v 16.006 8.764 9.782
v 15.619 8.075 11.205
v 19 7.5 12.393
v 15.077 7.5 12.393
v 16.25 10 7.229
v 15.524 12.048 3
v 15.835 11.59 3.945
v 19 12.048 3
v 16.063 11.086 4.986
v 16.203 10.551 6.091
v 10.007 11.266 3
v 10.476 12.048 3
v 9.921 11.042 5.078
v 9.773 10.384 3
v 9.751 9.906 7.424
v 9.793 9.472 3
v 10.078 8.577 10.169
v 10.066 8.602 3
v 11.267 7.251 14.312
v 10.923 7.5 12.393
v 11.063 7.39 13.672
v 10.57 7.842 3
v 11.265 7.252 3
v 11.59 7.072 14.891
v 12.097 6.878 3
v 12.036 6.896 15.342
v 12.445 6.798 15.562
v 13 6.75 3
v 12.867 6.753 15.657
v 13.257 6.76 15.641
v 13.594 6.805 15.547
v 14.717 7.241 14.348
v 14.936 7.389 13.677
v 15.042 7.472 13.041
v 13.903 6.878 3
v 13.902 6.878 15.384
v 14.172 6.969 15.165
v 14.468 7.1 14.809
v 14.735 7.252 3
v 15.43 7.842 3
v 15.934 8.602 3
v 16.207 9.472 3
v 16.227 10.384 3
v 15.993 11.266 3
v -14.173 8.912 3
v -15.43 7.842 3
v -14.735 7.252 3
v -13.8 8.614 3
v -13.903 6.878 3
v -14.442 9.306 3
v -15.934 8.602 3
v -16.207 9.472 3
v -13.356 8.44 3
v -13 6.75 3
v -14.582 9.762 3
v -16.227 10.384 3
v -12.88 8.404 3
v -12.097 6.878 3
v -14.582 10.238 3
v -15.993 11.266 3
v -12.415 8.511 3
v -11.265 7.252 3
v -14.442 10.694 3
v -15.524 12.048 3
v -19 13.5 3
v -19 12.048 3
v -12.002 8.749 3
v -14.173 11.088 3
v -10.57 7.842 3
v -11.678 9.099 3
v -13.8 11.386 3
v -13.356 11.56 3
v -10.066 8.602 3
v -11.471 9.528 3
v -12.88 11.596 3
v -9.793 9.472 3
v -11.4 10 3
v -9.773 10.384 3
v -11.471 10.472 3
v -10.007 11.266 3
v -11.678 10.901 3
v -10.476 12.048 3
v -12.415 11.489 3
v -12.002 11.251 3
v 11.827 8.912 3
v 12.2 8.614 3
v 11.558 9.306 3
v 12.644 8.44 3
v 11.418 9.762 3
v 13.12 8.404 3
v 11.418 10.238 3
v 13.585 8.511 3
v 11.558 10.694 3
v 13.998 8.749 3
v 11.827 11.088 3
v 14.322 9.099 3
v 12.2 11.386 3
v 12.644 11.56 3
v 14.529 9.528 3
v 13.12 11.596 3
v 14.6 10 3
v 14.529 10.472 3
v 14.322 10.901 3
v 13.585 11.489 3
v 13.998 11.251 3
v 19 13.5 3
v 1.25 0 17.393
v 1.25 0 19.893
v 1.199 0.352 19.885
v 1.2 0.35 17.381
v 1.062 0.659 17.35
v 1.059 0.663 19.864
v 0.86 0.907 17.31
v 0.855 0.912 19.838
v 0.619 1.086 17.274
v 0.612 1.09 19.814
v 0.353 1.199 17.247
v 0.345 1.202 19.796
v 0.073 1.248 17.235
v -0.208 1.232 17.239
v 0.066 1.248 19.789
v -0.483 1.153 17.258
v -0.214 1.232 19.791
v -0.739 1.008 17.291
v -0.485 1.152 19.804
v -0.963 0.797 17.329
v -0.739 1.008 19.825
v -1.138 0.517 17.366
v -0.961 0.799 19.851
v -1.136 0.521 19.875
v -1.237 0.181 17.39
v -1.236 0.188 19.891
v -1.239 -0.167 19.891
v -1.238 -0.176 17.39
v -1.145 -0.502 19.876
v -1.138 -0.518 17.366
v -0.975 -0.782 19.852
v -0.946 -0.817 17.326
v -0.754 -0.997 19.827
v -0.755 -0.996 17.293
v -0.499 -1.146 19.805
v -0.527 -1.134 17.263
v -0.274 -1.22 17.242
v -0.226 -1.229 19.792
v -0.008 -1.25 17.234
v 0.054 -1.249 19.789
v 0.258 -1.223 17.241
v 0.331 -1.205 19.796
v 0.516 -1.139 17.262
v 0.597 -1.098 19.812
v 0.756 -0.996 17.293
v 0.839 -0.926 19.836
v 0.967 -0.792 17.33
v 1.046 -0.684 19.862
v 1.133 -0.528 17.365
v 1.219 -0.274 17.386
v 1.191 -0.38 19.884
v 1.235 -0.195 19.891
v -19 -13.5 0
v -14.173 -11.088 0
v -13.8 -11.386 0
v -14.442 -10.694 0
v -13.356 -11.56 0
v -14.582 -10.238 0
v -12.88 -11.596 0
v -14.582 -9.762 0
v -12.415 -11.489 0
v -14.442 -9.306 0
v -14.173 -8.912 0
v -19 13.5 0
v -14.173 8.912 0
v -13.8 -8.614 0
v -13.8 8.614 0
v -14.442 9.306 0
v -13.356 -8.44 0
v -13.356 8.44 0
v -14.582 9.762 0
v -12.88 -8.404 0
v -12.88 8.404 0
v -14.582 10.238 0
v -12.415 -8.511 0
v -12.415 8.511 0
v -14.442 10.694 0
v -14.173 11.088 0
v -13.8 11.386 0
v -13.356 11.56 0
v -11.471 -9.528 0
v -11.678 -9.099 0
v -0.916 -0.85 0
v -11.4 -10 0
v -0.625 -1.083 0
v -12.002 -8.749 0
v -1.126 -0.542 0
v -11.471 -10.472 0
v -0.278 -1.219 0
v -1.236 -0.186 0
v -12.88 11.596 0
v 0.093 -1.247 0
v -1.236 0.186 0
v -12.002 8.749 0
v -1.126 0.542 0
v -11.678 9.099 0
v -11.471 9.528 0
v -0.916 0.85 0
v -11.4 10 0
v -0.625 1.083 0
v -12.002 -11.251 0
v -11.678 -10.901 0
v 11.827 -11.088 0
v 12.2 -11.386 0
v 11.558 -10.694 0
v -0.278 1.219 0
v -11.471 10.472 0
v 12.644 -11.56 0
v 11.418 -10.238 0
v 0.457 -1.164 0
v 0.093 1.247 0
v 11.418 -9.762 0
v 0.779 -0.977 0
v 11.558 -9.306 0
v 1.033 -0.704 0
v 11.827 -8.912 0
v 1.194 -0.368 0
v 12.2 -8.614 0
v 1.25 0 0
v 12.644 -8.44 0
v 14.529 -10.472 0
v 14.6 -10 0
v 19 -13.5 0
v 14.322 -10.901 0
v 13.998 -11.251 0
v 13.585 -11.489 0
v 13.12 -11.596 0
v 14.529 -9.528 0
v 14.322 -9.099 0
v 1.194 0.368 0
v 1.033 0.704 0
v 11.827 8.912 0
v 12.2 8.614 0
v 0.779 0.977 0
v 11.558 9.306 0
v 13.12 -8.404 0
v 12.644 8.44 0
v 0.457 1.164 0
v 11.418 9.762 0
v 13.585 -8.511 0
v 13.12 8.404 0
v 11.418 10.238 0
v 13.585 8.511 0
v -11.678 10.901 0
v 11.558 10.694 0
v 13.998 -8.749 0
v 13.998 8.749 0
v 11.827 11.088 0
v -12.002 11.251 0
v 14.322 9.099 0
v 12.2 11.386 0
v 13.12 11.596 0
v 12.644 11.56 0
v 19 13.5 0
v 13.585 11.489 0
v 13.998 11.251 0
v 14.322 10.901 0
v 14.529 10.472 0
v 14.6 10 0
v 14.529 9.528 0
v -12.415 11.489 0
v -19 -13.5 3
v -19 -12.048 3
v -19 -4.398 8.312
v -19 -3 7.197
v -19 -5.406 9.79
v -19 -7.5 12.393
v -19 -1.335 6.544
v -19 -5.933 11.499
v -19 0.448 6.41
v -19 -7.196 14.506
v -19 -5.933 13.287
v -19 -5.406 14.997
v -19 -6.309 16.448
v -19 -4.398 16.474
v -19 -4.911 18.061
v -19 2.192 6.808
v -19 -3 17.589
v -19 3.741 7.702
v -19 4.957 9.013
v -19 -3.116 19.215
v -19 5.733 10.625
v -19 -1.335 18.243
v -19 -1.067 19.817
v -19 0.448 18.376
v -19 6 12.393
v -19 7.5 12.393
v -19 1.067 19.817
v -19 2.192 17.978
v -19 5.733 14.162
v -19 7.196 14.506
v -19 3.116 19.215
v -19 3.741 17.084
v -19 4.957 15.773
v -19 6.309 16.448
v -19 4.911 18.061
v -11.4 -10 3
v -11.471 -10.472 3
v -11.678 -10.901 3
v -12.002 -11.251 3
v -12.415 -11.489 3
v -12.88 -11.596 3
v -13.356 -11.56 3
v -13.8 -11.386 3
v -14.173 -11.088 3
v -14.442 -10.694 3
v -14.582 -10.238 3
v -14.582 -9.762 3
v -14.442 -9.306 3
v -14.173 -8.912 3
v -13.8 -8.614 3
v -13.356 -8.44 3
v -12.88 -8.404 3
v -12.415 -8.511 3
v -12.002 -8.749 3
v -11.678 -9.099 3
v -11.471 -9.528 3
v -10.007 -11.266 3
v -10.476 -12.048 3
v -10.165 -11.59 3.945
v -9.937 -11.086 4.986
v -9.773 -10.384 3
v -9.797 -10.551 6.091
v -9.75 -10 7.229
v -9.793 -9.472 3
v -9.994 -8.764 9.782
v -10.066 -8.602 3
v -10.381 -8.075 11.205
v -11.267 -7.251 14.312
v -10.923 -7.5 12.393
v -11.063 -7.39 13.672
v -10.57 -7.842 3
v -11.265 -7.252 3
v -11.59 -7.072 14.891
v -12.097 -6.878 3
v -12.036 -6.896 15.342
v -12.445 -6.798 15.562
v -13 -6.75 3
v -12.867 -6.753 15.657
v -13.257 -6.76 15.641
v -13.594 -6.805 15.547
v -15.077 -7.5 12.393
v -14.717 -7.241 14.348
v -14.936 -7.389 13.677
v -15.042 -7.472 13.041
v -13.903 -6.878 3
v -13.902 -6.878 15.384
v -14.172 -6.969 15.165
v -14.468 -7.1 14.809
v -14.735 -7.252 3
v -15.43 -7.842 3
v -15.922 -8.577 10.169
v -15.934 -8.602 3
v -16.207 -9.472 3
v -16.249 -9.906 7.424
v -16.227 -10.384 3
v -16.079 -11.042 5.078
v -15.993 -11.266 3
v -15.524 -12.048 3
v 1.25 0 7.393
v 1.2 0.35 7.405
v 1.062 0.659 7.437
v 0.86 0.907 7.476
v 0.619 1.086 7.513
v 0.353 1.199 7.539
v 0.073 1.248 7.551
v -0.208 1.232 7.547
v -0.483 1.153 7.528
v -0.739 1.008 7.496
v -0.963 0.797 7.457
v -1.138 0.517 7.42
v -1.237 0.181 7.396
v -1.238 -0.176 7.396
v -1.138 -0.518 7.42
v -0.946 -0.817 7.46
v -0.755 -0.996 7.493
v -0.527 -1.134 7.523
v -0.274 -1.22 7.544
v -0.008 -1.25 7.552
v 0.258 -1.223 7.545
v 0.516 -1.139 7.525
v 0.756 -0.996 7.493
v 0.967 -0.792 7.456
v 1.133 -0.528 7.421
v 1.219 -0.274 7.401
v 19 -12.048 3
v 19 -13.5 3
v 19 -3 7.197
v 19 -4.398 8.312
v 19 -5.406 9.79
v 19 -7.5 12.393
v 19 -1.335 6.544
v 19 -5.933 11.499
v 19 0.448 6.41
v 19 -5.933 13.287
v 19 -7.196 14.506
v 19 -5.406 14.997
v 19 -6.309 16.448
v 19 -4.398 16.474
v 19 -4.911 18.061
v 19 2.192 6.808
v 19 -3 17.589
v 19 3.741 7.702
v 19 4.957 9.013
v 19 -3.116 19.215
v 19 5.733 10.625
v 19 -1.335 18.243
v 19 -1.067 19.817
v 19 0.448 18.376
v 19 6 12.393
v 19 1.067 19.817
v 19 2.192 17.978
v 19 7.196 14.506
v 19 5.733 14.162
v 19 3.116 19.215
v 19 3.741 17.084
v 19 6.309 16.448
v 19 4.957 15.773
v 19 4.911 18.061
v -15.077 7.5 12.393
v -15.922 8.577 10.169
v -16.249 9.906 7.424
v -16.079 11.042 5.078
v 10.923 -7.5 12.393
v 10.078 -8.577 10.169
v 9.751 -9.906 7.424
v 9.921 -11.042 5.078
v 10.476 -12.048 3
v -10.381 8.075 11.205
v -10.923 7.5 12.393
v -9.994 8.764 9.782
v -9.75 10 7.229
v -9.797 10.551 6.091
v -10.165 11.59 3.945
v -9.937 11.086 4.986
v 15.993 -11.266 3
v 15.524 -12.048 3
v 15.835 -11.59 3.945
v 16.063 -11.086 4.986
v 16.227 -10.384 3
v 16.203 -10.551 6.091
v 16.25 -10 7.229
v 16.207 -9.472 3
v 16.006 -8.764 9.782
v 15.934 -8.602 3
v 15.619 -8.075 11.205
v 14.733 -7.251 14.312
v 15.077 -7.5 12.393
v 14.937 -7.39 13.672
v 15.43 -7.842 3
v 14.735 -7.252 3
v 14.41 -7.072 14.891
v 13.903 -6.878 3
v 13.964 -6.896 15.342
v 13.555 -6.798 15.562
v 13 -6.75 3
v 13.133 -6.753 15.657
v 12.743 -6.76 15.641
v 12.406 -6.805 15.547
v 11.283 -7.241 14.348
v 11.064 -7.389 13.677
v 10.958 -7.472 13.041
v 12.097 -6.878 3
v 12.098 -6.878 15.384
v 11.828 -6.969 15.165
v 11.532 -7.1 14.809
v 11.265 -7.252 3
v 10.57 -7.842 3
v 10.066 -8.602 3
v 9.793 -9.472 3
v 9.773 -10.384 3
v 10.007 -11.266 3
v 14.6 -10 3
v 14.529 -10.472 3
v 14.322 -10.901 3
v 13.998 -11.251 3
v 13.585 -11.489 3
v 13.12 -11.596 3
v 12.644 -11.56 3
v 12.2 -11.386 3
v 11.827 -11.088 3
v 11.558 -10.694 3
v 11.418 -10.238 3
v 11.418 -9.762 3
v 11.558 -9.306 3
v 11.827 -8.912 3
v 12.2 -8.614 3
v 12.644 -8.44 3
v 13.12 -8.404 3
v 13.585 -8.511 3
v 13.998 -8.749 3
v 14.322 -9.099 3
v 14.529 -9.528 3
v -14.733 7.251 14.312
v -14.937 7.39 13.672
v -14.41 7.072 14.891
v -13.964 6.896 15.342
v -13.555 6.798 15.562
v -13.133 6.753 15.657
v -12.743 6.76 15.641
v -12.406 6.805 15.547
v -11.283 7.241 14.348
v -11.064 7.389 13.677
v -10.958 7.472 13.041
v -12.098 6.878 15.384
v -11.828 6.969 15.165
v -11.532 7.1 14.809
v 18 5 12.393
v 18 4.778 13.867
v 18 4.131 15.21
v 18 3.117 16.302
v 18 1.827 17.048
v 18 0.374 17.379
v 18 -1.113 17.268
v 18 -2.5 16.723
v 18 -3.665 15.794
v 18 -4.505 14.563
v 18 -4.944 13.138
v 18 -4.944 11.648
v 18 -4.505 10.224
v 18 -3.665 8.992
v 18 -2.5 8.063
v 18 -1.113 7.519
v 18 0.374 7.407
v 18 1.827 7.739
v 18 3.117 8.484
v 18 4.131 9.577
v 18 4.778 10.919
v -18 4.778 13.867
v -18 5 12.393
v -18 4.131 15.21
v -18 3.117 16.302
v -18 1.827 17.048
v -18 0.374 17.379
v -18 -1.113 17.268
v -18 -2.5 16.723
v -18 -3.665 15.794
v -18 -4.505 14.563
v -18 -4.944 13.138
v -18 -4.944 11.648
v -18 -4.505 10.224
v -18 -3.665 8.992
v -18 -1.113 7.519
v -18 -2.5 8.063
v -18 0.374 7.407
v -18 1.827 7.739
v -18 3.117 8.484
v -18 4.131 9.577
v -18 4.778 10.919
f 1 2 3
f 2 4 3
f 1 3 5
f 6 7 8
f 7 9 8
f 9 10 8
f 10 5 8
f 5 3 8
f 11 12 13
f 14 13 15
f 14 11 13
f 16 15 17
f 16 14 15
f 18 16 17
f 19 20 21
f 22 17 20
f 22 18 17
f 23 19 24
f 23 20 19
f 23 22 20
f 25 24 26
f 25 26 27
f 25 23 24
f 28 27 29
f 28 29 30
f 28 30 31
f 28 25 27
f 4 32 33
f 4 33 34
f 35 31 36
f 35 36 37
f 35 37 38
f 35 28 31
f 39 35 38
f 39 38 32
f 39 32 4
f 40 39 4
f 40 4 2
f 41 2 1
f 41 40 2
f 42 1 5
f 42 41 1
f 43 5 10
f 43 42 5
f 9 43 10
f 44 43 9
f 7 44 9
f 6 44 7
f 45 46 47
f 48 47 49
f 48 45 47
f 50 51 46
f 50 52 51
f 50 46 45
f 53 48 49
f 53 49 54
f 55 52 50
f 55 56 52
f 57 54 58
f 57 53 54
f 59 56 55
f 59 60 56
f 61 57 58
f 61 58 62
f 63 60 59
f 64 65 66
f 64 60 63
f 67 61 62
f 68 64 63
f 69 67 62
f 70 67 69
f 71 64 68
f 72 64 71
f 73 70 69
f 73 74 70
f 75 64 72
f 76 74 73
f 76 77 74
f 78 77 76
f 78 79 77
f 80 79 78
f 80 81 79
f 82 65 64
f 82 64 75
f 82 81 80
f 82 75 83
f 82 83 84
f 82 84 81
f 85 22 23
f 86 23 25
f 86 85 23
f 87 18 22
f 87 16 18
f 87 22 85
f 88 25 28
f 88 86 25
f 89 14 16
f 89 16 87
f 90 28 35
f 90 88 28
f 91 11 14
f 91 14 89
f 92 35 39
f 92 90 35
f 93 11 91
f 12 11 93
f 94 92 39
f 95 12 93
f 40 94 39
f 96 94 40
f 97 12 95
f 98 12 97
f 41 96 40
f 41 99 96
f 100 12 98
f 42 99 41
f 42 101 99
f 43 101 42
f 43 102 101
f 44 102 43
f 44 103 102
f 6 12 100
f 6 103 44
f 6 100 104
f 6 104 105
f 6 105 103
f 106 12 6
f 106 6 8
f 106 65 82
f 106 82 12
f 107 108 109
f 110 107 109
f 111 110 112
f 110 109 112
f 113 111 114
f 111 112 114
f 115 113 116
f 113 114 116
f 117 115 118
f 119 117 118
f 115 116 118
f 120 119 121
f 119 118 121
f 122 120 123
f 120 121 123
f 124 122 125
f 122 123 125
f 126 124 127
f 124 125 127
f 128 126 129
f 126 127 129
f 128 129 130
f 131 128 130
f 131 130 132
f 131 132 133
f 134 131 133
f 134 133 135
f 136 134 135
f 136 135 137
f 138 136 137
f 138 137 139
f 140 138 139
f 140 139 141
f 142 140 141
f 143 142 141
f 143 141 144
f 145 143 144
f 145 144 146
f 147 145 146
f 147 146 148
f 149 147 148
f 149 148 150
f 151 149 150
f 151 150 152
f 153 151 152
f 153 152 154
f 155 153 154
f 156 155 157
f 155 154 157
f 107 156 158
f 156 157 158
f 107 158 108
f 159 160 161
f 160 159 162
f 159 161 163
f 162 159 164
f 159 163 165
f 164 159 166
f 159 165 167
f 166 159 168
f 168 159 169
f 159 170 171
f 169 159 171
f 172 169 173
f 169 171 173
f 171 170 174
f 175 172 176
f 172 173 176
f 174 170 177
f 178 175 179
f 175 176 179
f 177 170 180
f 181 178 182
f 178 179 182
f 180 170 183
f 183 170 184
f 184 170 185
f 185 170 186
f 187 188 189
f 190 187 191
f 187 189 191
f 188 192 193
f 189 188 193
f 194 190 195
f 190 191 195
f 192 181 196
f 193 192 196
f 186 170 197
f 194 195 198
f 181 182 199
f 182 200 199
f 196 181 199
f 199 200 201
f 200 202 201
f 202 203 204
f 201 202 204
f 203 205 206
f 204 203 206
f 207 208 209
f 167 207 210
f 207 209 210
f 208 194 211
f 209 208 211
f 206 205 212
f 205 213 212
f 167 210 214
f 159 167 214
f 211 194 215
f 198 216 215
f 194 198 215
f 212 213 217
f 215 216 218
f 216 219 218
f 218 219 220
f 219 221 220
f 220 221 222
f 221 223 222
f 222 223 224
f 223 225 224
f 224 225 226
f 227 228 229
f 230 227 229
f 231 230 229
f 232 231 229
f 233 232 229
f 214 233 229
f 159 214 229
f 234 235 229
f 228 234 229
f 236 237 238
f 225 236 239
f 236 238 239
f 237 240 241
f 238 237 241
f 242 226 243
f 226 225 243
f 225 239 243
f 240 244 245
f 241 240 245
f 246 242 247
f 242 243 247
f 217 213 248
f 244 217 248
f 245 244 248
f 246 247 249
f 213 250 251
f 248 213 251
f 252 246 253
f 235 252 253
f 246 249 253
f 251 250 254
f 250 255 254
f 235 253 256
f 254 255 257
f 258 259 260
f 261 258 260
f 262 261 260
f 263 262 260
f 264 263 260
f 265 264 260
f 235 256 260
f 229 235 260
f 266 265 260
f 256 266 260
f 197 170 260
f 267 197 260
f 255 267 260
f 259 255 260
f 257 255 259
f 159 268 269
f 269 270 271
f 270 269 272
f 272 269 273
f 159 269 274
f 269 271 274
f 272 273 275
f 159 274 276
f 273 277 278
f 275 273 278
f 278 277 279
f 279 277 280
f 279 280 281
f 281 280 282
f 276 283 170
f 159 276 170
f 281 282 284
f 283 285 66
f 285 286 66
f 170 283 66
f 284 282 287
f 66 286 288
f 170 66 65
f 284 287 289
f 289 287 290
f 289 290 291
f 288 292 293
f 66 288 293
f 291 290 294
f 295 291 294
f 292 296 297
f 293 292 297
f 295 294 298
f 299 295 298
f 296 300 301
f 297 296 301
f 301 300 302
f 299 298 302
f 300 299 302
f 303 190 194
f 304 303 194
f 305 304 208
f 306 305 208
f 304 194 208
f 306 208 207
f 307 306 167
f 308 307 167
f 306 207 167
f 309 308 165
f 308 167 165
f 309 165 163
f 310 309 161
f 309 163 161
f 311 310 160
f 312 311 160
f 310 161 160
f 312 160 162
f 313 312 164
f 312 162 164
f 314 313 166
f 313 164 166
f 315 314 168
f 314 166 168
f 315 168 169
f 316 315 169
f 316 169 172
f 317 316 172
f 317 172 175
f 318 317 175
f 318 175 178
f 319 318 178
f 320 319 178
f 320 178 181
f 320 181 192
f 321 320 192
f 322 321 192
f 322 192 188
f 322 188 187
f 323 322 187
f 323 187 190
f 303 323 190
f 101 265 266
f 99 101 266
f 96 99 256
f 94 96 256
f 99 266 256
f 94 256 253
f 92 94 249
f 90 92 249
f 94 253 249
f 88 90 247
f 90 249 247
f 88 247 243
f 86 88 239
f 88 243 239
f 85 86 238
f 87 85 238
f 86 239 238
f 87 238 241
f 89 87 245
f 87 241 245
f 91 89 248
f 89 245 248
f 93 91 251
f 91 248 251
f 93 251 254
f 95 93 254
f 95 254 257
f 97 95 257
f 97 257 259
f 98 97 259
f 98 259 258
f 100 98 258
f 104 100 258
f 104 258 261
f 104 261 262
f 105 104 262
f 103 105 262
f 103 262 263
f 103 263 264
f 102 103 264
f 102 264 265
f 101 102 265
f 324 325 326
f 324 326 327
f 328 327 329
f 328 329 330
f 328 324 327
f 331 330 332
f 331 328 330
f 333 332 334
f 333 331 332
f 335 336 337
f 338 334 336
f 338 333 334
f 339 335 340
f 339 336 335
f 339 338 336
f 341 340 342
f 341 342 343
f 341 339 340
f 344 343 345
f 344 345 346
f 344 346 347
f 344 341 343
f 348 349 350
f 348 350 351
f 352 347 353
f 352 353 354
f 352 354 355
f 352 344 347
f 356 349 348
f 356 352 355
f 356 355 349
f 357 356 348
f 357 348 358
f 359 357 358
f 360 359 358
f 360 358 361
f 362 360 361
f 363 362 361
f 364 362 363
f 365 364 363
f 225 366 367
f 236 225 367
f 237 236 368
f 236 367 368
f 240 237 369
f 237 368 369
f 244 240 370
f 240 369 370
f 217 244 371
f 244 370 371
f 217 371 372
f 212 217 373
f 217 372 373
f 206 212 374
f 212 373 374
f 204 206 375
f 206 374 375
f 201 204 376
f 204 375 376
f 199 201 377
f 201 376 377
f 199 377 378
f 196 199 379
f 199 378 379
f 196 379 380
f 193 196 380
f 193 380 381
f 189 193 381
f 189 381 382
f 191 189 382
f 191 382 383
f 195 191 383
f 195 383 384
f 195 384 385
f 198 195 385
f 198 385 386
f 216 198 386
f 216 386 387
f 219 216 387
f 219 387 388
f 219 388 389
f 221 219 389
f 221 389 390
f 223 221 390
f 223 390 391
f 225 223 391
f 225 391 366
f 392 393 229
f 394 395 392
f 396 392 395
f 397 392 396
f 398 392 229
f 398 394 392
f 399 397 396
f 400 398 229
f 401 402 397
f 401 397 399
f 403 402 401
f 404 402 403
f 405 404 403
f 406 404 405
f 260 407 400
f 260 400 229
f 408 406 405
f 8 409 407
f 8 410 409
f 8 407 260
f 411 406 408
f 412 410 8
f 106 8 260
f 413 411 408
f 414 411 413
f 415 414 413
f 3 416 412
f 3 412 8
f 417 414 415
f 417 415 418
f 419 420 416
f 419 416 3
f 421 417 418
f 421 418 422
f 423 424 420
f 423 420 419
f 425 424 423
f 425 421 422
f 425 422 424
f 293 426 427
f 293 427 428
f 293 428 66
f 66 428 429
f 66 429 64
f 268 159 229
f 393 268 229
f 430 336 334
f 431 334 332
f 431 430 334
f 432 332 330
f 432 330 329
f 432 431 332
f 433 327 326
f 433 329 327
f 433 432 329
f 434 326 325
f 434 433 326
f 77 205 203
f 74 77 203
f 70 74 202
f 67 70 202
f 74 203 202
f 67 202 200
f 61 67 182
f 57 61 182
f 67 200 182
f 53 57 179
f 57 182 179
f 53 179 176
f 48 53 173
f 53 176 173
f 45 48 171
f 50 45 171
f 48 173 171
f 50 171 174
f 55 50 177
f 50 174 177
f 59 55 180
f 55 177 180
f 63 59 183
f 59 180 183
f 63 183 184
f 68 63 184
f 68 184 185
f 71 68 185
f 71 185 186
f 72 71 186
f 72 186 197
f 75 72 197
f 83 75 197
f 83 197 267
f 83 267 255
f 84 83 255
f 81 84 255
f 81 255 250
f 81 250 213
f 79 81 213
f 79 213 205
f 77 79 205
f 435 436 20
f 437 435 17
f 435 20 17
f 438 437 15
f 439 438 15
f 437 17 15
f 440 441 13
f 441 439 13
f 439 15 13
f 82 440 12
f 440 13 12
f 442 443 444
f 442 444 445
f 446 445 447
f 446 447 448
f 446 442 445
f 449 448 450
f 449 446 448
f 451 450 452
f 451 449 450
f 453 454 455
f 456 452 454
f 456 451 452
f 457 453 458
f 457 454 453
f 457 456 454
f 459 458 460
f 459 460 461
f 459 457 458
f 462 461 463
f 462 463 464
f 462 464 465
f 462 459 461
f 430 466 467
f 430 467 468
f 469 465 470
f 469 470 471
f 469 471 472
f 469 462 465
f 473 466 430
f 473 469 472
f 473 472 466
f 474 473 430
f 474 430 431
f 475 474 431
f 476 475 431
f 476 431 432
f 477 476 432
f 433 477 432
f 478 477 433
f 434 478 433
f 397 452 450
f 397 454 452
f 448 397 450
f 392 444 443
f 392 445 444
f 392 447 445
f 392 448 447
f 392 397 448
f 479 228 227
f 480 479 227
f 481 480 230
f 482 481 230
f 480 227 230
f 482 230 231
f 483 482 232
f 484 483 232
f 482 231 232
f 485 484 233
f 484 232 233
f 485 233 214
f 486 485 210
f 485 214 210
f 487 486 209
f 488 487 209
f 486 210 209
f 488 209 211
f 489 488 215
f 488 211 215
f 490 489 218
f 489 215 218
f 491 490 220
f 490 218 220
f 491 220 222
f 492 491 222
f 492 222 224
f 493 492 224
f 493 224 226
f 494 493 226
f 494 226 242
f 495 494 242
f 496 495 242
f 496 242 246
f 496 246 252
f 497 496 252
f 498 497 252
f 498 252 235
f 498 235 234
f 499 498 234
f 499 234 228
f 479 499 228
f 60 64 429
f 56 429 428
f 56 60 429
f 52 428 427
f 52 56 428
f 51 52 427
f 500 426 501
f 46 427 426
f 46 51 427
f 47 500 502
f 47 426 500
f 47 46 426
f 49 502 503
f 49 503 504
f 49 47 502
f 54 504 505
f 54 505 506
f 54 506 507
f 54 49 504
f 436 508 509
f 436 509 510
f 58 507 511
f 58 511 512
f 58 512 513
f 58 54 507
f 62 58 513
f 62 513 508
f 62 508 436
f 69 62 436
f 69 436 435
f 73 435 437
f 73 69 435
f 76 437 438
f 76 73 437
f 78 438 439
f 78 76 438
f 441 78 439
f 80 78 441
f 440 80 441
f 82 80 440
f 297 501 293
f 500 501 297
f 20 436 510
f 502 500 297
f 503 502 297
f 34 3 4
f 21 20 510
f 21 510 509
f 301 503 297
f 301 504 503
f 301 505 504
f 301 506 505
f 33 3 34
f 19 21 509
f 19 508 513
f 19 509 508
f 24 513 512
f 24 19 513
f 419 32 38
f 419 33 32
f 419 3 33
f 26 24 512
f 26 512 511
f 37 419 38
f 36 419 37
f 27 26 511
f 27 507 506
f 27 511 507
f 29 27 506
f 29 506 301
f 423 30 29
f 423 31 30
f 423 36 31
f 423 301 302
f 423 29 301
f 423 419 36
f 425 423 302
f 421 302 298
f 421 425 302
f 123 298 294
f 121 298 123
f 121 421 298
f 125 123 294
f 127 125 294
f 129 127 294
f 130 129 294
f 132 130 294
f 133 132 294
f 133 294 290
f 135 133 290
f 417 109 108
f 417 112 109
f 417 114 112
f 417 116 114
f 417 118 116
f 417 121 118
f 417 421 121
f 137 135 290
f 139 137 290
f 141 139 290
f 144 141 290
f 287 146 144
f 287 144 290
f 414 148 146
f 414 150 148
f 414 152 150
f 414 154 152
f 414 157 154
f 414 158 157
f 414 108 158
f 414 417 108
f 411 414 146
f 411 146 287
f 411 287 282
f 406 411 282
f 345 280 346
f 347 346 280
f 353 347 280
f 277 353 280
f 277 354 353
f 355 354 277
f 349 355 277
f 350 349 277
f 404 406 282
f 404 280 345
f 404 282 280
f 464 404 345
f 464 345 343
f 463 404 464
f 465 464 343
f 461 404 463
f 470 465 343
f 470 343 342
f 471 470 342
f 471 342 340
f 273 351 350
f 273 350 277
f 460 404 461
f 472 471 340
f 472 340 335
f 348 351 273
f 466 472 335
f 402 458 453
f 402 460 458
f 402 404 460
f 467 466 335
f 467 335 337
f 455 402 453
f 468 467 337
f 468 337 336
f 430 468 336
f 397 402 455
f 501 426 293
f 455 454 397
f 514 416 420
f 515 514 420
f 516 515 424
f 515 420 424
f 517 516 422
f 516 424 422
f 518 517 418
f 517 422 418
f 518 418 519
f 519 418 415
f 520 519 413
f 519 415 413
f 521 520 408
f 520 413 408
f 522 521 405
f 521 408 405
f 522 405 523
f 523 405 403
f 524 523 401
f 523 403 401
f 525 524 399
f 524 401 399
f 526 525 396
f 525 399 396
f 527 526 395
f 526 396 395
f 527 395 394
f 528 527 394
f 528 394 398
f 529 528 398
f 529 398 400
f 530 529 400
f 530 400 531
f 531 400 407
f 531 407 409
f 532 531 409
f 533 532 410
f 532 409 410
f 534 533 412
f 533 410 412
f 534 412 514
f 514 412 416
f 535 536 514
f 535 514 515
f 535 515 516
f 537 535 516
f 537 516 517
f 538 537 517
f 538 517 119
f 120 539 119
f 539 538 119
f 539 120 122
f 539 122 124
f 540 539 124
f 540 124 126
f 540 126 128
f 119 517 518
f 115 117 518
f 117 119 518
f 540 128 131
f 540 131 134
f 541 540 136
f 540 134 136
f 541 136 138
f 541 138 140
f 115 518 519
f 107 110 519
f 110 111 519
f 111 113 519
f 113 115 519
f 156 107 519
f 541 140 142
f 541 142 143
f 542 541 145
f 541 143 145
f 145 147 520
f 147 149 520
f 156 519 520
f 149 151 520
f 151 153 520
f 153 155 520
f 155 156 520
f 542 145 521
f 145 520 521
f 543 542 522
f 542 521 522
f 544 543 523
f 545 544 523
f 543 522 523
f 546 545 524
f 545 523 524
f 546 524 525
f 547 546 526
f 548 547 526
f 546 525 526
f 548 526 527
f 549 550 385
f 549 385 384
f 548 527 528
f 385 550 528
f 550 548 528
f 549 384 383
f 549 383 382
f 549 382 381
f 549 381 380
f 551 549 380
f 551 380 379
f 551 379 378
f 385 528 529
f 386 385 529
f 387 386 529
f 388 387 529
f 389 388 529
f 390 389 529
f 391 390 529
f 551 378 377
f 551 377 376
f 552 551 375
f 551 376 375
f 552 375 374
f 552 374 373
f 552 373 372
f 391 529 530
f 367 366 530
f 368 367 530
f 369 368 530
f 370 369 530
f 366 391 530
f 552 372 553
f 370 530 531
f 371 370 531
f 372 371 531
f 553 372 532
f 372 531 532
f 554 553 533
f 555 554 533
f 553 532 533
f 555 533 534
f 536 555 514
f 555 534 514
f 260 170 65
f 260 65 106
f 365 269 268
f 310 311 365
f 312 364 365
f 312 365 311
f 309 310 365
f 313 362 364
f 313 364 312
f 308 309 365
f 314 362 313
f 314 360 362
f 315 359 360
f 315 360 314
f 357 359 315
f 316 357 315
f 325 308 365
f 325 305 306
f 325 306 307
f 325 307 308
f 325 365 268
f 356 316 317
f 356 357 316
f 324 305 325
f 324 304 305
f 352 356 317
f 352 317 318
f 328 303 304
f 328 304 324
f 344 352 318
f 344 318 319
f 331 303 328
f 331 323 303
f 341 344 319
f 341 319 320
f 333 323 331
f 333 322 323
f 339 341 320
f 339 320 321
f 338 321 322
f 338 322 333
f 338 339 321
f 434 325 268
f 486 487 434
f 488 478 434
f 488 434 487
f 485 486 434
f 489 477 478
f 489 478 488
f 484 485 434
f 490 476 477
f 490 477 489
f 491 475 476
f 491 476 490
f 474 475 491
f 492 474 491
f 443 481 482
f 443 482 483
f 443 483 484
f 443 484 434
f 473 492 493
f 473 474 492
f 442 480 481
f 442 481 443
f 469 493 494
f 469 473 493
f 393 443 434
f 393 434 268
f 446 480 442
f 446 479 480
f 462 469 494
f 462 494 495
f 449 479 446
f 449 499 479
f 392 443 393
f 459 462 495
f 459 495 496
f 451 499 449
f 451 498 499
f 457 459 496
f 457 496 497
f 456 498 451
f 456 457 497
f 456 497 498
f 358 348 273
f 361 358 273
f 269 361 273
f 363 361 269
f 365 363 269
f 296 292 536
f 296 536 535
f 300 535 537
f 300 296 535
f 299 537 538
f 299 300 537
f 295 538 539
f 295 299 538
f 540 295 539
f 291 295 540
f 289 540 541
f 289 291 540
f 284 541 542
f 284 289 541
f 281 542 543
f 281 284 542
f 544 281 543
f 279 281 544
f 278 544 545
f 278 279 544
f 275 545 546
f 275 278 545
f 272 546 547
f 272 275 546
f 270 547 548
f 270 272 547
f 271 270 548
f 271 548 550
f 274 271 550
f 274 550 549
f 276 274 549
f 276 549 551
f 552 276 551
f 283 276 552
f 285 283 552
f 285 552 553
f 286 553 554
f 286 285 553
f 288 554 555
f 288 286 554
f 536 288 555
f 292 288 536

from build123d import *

# Parameters (mm, degrees)
SKETCH_W        = 38
SKETCH_H        = 27
SKETCH_R        = 1.65
PAD_DEPTH       = 3
SKETCH001_R     = 5
PAD001_DEPTH    = 38
SKETCH002_R     = 1.6
POCKET_DEPTH    = 19.894216
SKETCH004_R     = 1.25
POCKET002_DEPTH = 20.001
SKETCH005_R     = 3.25
POCKET003_DEPTH = 16.894216
CHAMFER_SIZE    = 1
CHAMFER001_SIZE = 1


with BuildPart() as part:
    # Sketch → Pad (new body)
    with BuildSketch(Plane.XY):
        Rectangle(SKETCH_W, SKETCH_H)
        with Locations((-13, -10)):
            Circle(SKETCH_R, mode=Mode.SUBTRACT)
        with Locations((-13, 10)):
            Circle(SKETCH_R, mode=Mode.SUBTRACT)
        with Locations((13, 10)):
            Circle(SKETCH_R, mode=Mode.SUBTRACT)
        with Locations((13, -10)):
            Circle(SKETCH_R, mode=Mode.SUBTRACT)
    extrude(amount=PAD_DEPTH)

    # Sketch001 (on Face2 of Pad) → Pad001 (join)
    with BuildSketch(Plane.YZ.offset(19)):
        with BuildLine():
            ThreePointArc((7.5, 12.393216), (0, 19.893216), (-7.5, 12.393216))
            Line((-7.5, 12.393216), (-13.5, 0))
            Line((-13.5, 0), (13.5, 0))
            Line((7.5, 12.393216), (13.5, 0))
        make_face()
        with Locations((0, 12.393216)):
            Circle(SKETCH001_R, mode=Mode.SUBTRACT)
    extrude(amount=-PAD001_DEPTH)

    # Sketch002 (on Face4 of Pad001) → Pocket (cut, through all)
    with BuildSketch(Plane(origin=(0, 0, 0), x_dir=(1, 0, 0), z_dir=(0, 0, -1))):
        with Locations((13, 10)):
            Circle(SKETCH002_R)
        with Locations((-13, 10)):
            Circle(SKETCH002_R)
        with Locations((-13, -10)):
            Circle(SKETCH002_R)
        with Locations((13, -10)):
            Circle(SKETCH002_R)
    extrude(amount=-POCKET_DEPTH, mode=Mode.SUBTRACT)

    # Sketch004 → Pocket002 (cut, through all)
    with BuildSketch(Plane.XY.offset(20)):
        Circle(SKETCH004_R)
    extrude(amount=-POCKET002_DEPTH, mode=Mode.SUBTRACT)

    # Sketch005 (on Face19 of Pocket002) → Pocket003 (cut, through all)
    with BuildSketch(Plane.XY.offset(3)):
        with Locations((-13, 10)):
            Circle(SKETCH005_R)
        with Locations((13, 10)):
            Circle(SKETCH005_R)
        with Locations((13, -10)):
            Circle(SKETCH005_R)
        with Locations((-13, -10)):
            Circle(SKETCH005_R)
    extrude(amount=POCKET003_DEPTH, mode=Mode.SUBTRACT)

    # Chamfer
    chamfer_edges = [part.edges().sort_by_distance(p)[0] for p in [
        (19, -5, 12.393216),
    ]]
    chamfer(chamfer_edges, length=CHAMFER_SIZE)

    # Chamfer001
    chamfer001_edges = [part.edges().sort_by_distance(p)[0] for p in [
        (-19, -5, 12.393216),
    ]]
    chamfer(chamfer001_edges, length=CHAMFER001_SIZE)


solid = part.part
